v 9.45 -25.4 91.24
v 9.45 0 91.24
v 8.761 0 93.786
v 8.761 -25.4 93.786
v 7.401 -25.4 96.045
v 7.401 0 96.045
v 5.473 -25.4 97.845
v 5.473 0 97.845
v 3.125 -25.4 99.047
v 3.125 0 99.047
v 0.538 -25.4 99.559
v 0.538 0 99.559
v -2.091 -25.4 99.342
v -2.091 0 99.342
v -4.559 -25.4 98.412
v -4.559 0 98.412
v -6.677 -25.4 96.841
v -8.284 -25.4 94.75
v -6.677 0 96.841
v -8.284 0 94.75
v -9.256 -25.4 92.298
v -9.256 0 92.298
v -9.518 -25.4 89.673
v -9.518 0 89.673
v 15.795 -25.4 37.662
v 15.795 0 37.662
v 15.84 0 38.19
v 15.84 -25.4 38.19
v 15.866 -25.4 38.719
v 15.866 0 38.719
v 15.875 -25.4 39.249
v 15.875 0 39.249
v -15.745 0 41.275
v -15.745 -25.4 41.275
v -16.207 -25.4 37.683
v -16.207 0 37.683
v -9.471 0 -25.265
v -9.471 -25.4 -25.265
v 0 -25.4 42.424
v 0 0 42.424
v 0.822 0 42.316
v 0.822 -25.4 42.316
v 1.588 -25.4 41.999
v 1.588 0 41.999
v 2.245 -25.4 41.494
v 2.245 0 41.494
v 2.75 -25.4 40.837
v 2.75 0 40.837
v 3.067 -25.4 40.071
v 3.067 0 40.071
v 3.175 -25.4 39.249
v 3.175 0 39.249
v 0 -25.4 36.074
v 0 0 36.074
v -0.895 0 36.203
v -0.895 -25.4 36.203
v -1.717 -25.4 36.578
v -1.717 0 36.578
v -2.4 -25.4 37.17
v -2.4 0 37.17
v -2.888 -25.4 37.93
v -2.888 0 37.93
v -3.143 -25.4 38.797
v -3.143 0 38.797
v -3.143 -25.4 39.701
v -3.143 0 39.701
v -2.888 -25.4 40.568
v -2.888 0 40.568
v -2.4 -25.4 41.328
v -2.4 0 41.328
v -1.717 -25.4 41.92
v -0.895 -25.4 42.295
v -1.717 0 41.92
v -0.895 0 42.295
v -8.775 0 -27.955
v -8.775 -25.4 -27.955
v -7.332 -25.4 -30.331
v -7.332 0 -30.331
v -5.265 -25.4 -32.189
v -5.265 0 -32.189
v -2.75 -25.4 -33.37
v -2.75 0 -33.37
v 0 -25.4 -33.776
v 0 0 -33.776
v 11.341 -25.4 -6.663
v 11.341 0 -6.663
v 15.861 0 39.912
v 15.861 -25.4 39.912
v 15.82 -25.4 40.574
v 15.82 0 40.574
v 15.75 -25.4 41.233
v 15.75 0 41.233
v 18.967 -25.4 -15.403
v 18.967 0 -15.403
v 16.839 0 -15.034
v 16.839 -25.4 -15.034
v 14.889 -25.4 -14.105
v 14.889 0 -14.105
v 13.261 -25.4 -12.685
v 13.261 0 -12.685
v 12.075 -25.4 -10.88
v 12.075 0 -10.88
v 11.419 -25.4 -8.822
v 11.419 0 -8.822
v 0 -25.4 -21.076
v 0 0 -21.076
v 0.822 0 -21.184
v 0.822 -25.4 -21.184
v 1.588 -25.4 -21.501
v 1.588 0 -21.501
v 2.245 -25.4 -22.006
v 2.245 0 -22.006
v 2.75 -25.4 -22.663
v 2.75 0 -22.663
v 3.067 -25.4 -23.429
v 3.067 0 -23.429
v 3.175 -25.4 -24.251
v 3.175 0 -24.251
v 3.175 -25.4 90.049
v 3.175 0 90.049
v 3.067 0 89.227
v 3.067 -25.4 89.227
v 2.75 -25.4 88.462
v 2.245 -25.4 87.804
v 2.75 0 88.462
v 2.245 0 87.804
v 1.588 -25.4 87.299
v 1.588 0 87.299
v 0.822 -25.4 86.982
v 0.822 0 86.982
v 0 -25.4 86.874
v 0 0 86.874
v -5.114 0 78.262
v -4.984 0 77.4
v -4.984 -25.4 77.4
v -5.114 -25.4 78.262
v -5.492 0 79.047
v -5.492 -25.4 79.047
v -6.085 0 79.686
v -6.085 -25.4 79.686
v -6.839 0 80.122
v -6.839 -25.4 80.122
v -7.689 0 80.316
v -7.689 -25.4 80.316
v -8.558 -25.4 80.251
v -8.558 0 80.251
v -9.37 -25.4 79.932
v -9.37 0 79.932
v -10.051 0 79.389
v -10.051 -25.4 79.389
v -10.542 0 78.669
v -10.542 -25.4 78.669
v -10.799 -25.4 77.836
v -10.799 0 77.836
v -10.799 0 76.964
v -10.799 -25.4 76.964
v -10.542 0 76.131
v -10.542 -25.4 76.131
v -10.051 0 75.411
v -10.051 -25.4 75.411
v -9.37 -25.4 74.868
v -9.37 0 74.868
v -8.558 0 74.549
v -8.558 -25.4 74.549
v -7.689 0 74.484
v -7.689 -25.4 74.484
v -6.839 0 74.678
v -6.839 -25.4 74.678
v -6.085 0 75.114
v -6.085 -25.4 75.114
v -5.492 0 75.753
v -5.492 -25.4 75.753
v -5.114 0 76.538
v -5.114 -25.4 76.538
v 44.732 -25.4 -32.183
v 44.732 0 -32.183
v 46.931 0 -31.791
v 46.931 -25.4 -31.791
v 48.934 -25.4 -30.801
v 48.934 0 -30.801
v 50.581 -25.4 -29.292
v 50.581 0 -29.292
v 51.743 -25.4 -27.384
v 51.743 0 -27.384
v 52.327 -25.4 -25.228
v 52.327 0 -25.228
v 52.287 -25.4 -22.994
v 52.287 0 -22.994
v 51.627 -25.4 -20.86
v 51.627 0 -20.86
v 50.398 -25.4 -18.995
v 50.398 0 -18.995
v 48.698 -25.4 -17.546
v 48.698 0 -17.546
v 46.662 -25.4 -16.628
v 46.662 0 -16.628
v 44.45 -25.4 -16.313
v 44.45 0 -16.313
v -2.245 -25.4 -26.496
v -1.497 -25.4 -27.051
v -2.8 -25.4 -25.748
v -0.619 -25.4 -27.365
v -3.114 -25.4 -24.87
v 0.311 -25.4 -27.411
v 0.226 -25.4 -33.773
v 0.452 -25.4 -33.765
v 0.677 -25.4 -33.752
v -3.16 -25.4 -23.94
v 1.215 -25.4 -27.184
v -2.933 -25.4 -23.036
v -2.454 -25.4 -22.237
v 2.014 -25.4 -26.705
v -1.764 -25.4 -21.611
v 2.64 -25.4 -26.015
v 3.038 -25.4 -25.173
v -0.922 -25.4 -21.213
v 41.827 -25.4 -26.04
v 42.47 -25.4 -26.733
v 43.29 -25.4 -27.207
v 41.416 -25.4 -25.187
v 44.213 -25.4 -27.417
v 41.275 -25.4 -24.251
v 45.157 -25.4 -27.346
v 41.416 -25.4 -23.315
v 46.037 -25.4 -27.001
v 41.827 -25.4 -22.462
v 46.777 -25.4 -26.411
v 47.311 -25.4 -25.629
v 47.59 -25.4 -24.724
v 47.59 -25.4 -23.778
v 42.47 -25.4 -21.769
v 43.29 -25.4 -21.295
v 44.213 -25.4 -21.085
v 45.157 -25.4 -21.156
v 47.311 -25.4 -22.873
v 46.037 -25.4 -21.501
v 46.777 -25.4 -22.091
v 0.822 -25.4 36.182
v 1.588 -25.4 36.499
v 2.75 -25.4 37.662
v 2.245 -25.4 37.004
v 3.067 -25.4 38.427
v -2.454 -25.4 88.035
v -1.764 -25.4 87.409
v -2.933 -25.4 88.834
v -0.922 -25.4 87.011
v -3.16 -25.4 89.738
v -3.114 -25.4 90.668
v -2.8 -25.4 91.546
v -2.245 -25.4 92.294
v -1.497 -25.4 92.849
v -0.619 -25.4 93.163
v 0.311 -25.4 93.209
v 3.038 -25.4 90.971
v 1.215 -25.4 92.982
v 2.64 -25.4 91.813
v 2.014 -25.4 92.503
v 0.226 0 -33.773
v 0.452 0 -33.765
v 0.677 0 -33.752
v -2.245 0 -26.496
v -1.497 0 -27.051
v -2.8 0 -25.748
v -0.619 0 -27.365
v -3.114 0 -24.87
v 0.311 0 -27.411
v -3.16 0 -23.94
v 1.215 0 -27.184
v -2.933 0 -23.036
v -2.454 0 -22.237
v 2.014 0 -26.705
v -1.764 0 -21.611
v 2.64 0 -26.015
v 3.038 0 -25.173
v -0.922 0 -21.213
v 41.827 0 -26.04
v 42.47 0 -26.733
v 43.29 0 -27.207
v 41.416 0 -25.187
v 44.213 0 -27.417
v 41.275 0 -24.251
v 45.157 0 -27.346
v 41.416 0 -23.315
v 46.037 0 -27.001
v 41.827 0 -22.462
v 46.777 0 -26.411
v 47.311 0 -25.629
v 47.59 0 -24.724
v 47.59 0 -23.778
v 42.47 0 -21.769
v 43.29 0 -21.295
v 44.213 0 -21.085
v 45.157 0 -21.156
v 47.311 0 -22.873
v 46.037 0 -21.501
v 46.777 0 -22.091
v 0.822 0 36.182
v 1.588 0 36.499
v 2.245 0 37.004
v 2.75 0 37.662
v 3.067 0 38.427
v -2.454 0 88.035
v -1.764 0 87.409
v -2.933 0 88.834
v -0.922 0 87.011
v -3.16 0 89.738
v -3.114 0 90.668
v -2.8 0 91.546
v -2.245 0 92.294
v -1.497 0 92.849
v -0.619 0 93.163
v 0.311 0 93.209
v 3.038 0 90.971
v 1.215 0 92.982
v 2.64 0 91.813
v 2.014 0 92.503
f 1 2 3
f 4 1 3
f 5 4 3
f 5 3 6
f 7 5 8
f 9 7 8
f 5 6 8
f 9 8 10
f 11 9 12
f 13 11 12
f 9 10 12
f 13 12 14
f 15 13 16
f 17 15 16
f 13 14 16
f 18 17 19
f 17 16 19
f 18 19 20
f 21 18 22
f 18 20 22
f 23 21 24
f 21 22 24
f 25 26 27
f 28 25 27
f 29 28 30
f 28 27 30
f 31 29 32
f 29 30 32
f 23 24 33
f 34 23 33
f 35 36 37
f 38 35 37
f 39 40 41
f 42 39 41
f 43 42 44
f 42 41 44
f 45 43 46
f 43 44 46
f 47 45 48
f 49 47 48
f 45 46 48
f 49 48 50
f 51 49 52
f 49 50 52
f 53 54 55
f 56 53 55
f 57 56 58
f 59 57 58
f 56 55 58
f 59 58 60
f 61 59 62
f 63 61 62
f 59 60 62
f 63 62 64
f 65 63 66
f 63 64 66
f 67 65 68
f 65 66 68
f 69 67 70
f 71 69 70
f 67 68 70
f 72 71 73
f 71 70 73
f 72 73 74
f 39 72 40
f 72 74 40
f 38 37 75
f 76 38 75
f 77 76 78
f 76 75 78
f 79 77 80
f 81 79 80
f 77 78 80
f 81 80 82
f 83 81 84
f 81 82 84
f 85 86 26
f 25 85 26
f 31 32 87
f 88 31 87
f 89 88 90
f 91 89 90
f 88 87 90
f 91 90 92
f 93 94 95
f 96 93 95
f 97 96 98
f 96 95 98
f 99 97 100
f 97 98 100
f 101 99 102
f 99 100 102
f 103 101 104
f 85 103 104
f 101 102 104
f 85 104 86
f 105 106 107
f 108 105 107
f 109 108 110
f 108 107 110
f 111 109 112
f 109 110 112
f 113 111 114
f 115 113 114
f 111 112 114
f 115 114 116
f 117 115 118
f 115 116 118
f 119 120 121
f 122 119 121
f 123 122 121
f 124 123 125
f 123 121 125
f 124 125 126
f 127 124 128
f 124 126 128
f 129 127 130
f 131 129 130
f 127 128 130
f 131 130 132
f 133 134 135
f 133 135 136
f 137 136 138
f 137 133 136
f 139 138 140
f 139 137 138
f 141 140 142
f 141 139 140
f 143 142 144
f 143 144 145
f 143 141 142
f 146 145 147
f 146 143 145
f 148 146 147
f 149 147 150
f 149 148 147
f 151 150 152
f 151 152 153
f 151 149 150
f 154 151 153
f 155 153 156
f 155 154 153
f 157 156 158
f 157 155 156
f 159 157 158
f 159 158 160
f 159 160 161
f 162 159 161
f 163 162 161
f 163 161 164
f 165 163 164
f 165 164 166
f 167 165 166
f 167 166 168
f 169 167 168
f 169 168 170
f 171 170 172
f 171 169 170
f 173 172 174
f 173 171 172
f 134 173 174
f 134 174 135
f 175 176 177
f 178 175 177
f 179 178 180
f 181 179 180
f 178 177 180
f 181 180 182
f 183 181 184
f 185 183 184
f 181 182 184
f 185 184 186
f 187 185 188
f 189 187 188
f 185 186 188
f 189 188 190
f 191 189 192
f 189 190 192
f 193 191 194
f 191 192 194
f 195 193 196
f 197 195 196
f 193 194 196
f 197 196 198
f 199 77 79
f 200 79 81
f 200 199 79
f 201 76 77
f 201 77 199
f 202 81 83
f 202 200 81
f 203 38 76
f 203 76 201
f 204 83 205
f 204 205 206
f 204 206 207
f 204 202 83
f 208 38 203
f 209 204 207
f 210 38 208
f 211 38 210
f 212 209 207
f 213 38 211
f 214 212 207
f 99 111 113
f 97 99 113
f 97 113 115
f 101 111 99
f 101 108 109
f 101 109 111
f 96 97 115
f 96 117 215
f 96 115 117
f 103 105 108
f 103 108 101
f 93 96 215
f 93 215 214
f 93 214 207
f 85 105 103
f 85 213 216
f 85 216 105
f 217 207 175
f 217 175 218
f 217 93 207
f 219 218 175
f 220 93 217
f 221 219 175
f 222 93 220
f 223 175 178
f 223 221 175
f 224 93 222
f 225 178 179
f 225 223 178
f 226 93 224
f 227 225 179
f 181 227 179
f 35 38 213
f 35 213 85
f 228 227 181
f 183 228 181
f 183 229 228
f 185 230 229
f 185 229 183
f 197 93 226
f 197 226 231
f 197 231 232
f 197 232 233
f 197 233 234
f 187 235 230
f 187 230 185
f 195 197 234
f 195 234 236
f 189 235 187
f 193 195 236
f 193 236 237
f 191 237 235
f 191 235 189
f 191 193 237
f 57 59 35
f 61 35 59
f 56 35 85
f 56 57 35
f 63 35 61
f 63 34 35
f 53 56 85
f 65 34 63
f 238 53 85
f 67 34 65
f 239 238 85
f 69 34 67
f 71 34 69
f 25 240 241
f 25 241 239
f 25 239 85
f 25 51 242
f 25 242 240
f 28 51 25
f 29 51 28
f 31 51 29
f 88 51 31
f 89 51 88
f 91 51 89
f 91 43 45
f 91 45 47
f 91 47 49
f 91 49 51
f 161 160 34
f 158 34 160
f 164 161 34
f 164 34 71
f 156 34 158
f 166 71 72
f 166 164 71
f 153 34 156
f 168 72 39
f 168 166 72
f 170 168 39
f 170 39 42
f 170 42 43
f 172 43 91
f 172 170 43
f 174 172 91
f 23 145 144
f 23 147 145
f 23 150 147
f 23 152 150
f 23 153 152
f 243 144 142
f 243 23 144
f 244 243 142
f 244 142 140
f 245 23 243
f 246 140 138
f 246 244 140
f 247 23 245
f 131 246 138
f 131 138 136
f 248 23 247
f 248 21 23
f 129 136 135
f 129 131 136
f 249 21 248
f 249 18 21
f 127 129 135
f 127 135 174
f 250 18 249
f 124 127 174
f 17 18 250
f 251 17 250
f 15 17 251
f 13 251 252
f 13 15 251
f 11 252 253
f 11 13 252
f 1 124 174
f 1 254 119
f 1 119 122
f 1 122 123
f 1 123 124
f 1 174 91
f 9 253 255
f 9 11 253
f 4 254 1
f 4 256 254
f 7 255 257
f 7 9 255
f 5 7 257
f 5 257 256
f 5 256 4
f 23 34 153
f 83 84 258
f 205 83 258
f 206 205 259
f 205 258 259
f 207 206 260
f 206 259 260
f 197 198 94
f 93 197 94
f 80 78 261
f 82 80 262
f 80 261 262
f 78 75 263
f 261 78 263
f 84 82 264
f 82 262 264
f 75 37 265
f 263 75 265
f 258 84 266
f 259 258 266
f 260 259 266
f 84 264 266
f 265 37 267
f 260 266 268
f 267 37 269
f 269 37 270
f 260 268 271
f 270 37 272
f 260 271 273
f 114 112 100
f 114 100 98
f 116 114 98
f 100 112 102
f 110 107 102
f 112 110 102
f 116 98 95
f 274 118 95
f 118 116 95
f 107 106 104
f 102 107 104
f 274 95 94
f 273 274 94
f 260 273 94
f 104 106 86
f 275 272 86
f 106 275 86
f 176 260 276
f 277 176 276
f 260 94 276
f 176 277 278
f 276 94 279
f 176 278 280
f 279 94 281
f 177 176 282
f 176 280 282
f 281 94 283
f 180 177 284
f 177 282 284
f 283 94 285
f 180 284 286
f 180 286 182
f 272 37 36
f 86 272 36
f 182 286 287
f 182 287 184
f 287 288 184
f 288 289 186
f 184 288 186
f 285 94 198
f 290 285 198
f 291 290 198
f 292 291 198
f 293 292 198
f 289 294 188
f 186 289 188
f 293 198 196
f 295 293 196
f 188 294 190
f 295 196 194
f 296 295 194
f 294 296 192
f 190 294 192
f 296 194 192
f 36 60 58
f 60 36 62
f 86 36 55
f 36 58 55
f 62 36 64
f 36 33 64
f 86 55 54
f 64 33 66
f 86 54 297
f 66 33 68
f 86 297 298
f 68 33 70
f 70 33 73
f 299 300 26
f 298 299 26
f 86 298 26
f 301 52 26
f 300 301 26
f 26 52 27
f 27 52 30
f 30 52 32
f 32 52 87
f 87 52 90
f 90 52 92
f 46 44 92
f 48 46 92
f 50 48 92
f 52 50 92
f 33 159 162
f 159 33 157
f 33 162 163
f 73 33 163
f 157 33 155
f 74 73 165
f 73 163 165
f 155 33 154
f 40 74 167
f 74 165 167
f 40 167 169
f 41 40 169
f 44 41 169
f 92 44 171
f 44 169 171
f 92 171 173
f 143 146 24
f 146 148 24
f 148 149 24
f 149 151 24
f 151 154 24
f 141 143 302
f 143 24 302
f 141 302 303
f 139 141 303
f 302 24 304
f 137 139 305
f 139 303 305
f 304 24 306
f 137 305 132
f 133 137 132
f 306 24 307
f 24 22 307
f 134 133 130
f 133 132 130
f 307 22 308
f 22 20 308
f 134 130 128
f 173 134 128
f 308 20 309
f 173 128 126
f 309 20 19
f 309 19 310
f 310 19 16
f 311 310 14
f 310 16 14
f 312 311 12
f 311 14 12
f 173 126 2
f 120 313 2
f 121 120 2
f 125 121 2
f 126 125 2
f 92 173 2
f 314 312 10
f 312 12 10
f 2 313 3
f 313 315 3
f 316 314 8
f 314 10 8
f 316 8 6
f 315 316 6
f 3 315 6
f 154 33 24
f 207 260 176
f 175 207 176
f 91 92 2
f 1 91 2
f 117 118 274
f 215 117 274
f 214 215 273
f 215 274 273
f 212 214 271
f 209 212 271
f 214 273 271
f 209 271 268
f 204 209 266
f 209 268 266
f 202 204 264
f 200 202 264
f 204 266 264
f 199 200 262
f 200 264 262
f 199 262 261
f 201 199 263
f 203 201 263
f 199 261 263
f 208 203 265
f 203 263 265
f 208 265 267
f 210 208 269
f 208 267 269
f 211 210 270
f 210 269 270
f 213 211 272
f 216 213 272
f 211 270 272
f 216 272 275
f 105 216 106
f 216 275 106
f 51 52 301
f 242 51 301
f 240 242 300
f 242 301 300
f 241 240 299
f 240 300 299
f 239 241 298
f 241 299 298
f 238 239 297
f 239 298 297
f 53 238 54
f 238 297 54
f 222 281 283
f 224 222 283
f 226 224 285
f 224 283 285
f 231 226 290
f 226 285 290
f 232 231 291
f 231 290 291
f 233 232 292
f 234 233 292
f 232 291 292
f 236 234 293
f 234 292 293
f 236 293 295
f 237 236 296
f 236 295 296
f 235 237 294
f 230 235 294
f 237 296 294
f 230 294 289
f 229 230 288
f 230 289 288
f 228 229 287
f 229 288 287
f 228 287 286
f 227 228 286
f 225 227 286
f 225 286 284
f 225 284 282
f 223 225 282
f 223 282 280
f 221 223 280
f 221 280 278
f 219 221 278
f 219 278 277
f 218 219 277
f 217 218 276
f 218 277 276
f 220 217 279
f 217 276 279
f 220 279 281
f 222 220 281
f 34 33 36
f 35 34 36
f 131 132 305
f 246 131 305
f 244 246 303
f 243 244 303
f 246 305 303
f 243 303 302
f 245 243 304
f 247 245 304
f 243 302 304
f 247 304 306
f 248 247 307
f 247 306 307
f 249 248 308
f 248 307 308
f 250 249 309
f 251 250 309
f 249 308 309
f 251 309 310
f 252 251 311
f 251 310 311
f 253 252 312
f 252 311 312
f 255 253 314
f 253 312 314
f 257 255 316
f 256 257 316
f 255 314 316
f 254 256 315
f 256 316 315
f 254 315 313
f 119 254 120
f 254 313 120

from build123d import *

# Parameters (mm, degrees)
F0_R     = 2.9240242171
F1_DEPTH = 25.4


with BuildPart() as f1:
    # F0 (on Front) → F1 (new body)
    with BuildSketch(Plane.XZ):
        with BuildLine():
            ThreePointArc((-9.5175899986, 89.6733759373), (-6.601047317, 83.1822994355), (0, 80.5240162142))
            ThreePointArc((0, 80.5240162142), (6.7351920908, 83.3138241234), (9.525, 90.0490162142))
            ThreePointArc((9.525, 90.0490162142), (9.5063048942, 90.6454994562), (9.4502929642, 91.2396412142))
            ThreePointArc((9.4502929642, 91.2396412142), (-0.7838551857, 99.5417079319), (-9.5175899986, 89.6733759373))
        make_face()
        with BuildLine():
            ThreePointArc((3.175, 90.0490162142), (2.2450640303, 87.8039521839), (0, 86.8740162142))
            ThreePointArc((0, 86.8740162142), (-2.2450640303, 92.2940802445), (3.175, 90.0490162142))
        make_face(mode=Mode.SUBTRACT)
        with BuildLine():
            ThreePointArc((9.525, 90.0490162142), (6.7351920908, 83.3138241234), (0, 80.5240162142))
            Line((0, 80.5240162142), (0, 55.1240162142))
            ThreePointArc((0, 55.1240162142), (10.5003255158, 51.1552662142), (15.7504882737, 41.2333912142))
            Line((15.7504882737, 41.2333912142), (9.4502929642, 91.2396412142))
            ThreePointArc((9.4502929642, 91.2396412142), (9.5063048942, 90.6454994562), (9.525, 90.0490162142))
        make_face()
        with BuildLine():
            Line((0, 55.1240162142), (0, 80.5240162142))
            ThreePointArc((0, 80.5240162142), (-6.601047317, 83.1822994355), (-9.5175899986, 89.6733759373))
            Line((-9.5175899986, 89.6733759373), (-15.7451890335, 41.2750091314))
            ThreePointArc((-15.7451890335, 41.2750091314), (-10.4845836217, 51.1691307808), (0, 55.1240162142))
        make_face()
        with Locations((-7.9077519476, 77.4001702666)):
            Circle(F0_R, mode=Mode.SUBTRACT)
        with BuildLine():
            ThreePointArc((15.7504882737, 41.2333912142), (10.5003255158, 51.1552662142), (0, 55.1240162142))
            Line((0, 55.1240162142), (0, 42.4240162142))
            ThreePointArc((0, 42.4240162142), (2.2450640303, 41.4940802445), (3.175, 39.2490162142))
            ThreePointArc((3.175, 39.2490162142), (2.2450640303, 37.0039521839), (0, 36.0740162142))
            Line((0, 36.0740162142), (0, 23.3740162142))
            ThreePointArc((0, 23.3740162142), (10.6492737428, 27.4758011159), (15.7954255641, 37.6615162142))
            ThreePointArc((15.7954255641, 37.6615162142), (15.8550939106, 38.4542696601), (15.875, 39.2490162142))
            ThreePointArc((15.875, 39.2490162142), (15.8438414904, 40.2431549508), (15.7504882737, 41.2333912142))
        make_face()
        with BuildLine():
            Line((0, 42.4240162142), (0, 55.1240162142))
            ThreePointArc((0, 55.1240162142), (-10.4845836217, 51.1691307808), (-15.7451890335, 41.2750091314))
            ThreePointArc((-15.7451890335, 41.2750091314), (-11.9201145666, 28.7644325925), (0, 23.3740162142))
            Line((0, 23.3740162142), (0, 36.0740162142))
            ThreePointArc((0, 36.0740162142), (-3.175, 39.2490162142), (0, 42.4240162142))
        make_face()
        with BuildLine():
            ThreePointArc((0, 23.3740162142), (-11.9201145666, 28.7644325925), (-15.7451890335, 41.2750091314))
            Line((-15.7451890335, 41.2750091314), (-16.2073878987, 37.6829875368))
            Line((-16.2073878987, 37.6829875368), (-9.4709206869, -25.2645351372))
            ThreePointArc((-9.4709206869, -25.2645351372), (-7.0844795723, -17.8842126898), (0, -14.7259837858))
            Line((0, -14.7259837858), (0, 23.3740162142))
        make_face()
        with BuildLine():
            ThreePointArc((15.7954255641, 37.6615162142), (10.6492737428, 27.4758011159), (0, 23.3740162142))
            Line((0, 23.3740162142), (0, -14.7259837858))
            ThreePointArc((0, -14.7259837858), (6.7351920908, -17.515791695), (9.525, -24.2509837858))
            Line((9.525, -24.2509837858), (36.5125, -24.2509837858))
            ThreePointArc((36.5125, -24.2509837858), (38.8373399243, -18.6383237101), (44.45, -16.3134837858))
            Line((44.45, -16.3134837858), (18.9672152943, -15.403384332))
            ThreePointArc((18.9672152943, -15.403384332), (13.2606937919, -12.6853206287), (11.3406209777, -6.6632297674))
            Line((11.3406209777, -6.6632297674), (15.7954255641, 37.6615162142))
        make_face()
        with BuildLine():
            Line((0, -21.0759837858), (0, -14.7259837858))
            ThreePointArc((0, -14.7259837858), (-7.0844795723, -17.8842126898), (-9.4709206869, -25.2645351372))
            ThreePointArc((-9.4709206869, -25.2645351372), (-6.366771096, -31.3354633582), (0, -33.7759837858))
            Line((0, -33.7759837858), (0.6773435479, -33.7518695718))
            ThreePointArc((0.6773435479, -33.7518695718), (6.9705567315, -30.7422828741), (9.525, -24.2509837858))
            Line((9.525, -24.2509837858), (3.175, -24.2509837858))
            ThreePointArc((3.175, -24.2509837858), (-2.2450640303, -26.4960478161), (0, -21.0759837858))
        make_face()
        with BuildLine():
            Line((36.5125, -24.2509837858), (9.525, -24.2509837858))
            ThreePointArc((9.525, -24.2509837858), (6.9705567315, -30.7422828741), (0.6773435479, -33.7518695718))
            Line((0.6773435479, -33.7518695718), (44.7324052746, -32.1834584004))
            ThreePointArc((44.7324052746, -32.1834584004), (38.9380895153, -29.9626165697), (36.5125, -24.2509837858))
        make_face()
        with BuildLine():
            Line((0.6773435479, -33.7518695718), (0, -33.7759837858))
            ThreePointArc((0, -33.7759837858), (0.3388863295, -33.7699533233), (0.6773435479, -33.7518695718))
        make_face()
        with BuildLine():
            ThreePointArc((44.45, -16.3134837858), (38.8373399243, -18.6383237101), (36.5125, -24.2509837858))
            ThreePointArc((36.5125, -24.2509837858), (38.9380895153, -29.9626165697), (44.7324052746, -32.1834584004))
            ThreePointArc((44.7324052746, -32.1834584004), (50.1616327839, -29.7628942705), (52.3875, -24.2509837858))
            ThreePointArc((52.3875, -24.2509837858), (50.0626600757, -18.6383237101), (44.45, -16.3134837858))
        make_face()
        with BuildLine():
            ThreePointArc((47.625, -24.2509837858), (44.45, -27.4259837858), (41.275, -24.2509837858))
            ThreePointArc((41.275, -24.2509837858), (44.45, -21.0759837858), (47.625, -24.2509837858))
        make_face(mode=Mode.SUBTRACT)
        with BuildLine():
            ThreePointArc((9.525, -24.2509837858), (6.7351920908, -17.515791695), (0, -14.7259837858))
            Line((0, -14.7259837858), (0, -21.0759837858))
            ThreePointArc((0, -21.0759837858), (2.2450640303, -22.0059197555), (3.175, -24.2509837858))
            Line((3.175, -24.2509837858), (9.525, -24.2509837858))
        make_face()
    extrude(amount=F1_DEPTH)


solid = f1.part
